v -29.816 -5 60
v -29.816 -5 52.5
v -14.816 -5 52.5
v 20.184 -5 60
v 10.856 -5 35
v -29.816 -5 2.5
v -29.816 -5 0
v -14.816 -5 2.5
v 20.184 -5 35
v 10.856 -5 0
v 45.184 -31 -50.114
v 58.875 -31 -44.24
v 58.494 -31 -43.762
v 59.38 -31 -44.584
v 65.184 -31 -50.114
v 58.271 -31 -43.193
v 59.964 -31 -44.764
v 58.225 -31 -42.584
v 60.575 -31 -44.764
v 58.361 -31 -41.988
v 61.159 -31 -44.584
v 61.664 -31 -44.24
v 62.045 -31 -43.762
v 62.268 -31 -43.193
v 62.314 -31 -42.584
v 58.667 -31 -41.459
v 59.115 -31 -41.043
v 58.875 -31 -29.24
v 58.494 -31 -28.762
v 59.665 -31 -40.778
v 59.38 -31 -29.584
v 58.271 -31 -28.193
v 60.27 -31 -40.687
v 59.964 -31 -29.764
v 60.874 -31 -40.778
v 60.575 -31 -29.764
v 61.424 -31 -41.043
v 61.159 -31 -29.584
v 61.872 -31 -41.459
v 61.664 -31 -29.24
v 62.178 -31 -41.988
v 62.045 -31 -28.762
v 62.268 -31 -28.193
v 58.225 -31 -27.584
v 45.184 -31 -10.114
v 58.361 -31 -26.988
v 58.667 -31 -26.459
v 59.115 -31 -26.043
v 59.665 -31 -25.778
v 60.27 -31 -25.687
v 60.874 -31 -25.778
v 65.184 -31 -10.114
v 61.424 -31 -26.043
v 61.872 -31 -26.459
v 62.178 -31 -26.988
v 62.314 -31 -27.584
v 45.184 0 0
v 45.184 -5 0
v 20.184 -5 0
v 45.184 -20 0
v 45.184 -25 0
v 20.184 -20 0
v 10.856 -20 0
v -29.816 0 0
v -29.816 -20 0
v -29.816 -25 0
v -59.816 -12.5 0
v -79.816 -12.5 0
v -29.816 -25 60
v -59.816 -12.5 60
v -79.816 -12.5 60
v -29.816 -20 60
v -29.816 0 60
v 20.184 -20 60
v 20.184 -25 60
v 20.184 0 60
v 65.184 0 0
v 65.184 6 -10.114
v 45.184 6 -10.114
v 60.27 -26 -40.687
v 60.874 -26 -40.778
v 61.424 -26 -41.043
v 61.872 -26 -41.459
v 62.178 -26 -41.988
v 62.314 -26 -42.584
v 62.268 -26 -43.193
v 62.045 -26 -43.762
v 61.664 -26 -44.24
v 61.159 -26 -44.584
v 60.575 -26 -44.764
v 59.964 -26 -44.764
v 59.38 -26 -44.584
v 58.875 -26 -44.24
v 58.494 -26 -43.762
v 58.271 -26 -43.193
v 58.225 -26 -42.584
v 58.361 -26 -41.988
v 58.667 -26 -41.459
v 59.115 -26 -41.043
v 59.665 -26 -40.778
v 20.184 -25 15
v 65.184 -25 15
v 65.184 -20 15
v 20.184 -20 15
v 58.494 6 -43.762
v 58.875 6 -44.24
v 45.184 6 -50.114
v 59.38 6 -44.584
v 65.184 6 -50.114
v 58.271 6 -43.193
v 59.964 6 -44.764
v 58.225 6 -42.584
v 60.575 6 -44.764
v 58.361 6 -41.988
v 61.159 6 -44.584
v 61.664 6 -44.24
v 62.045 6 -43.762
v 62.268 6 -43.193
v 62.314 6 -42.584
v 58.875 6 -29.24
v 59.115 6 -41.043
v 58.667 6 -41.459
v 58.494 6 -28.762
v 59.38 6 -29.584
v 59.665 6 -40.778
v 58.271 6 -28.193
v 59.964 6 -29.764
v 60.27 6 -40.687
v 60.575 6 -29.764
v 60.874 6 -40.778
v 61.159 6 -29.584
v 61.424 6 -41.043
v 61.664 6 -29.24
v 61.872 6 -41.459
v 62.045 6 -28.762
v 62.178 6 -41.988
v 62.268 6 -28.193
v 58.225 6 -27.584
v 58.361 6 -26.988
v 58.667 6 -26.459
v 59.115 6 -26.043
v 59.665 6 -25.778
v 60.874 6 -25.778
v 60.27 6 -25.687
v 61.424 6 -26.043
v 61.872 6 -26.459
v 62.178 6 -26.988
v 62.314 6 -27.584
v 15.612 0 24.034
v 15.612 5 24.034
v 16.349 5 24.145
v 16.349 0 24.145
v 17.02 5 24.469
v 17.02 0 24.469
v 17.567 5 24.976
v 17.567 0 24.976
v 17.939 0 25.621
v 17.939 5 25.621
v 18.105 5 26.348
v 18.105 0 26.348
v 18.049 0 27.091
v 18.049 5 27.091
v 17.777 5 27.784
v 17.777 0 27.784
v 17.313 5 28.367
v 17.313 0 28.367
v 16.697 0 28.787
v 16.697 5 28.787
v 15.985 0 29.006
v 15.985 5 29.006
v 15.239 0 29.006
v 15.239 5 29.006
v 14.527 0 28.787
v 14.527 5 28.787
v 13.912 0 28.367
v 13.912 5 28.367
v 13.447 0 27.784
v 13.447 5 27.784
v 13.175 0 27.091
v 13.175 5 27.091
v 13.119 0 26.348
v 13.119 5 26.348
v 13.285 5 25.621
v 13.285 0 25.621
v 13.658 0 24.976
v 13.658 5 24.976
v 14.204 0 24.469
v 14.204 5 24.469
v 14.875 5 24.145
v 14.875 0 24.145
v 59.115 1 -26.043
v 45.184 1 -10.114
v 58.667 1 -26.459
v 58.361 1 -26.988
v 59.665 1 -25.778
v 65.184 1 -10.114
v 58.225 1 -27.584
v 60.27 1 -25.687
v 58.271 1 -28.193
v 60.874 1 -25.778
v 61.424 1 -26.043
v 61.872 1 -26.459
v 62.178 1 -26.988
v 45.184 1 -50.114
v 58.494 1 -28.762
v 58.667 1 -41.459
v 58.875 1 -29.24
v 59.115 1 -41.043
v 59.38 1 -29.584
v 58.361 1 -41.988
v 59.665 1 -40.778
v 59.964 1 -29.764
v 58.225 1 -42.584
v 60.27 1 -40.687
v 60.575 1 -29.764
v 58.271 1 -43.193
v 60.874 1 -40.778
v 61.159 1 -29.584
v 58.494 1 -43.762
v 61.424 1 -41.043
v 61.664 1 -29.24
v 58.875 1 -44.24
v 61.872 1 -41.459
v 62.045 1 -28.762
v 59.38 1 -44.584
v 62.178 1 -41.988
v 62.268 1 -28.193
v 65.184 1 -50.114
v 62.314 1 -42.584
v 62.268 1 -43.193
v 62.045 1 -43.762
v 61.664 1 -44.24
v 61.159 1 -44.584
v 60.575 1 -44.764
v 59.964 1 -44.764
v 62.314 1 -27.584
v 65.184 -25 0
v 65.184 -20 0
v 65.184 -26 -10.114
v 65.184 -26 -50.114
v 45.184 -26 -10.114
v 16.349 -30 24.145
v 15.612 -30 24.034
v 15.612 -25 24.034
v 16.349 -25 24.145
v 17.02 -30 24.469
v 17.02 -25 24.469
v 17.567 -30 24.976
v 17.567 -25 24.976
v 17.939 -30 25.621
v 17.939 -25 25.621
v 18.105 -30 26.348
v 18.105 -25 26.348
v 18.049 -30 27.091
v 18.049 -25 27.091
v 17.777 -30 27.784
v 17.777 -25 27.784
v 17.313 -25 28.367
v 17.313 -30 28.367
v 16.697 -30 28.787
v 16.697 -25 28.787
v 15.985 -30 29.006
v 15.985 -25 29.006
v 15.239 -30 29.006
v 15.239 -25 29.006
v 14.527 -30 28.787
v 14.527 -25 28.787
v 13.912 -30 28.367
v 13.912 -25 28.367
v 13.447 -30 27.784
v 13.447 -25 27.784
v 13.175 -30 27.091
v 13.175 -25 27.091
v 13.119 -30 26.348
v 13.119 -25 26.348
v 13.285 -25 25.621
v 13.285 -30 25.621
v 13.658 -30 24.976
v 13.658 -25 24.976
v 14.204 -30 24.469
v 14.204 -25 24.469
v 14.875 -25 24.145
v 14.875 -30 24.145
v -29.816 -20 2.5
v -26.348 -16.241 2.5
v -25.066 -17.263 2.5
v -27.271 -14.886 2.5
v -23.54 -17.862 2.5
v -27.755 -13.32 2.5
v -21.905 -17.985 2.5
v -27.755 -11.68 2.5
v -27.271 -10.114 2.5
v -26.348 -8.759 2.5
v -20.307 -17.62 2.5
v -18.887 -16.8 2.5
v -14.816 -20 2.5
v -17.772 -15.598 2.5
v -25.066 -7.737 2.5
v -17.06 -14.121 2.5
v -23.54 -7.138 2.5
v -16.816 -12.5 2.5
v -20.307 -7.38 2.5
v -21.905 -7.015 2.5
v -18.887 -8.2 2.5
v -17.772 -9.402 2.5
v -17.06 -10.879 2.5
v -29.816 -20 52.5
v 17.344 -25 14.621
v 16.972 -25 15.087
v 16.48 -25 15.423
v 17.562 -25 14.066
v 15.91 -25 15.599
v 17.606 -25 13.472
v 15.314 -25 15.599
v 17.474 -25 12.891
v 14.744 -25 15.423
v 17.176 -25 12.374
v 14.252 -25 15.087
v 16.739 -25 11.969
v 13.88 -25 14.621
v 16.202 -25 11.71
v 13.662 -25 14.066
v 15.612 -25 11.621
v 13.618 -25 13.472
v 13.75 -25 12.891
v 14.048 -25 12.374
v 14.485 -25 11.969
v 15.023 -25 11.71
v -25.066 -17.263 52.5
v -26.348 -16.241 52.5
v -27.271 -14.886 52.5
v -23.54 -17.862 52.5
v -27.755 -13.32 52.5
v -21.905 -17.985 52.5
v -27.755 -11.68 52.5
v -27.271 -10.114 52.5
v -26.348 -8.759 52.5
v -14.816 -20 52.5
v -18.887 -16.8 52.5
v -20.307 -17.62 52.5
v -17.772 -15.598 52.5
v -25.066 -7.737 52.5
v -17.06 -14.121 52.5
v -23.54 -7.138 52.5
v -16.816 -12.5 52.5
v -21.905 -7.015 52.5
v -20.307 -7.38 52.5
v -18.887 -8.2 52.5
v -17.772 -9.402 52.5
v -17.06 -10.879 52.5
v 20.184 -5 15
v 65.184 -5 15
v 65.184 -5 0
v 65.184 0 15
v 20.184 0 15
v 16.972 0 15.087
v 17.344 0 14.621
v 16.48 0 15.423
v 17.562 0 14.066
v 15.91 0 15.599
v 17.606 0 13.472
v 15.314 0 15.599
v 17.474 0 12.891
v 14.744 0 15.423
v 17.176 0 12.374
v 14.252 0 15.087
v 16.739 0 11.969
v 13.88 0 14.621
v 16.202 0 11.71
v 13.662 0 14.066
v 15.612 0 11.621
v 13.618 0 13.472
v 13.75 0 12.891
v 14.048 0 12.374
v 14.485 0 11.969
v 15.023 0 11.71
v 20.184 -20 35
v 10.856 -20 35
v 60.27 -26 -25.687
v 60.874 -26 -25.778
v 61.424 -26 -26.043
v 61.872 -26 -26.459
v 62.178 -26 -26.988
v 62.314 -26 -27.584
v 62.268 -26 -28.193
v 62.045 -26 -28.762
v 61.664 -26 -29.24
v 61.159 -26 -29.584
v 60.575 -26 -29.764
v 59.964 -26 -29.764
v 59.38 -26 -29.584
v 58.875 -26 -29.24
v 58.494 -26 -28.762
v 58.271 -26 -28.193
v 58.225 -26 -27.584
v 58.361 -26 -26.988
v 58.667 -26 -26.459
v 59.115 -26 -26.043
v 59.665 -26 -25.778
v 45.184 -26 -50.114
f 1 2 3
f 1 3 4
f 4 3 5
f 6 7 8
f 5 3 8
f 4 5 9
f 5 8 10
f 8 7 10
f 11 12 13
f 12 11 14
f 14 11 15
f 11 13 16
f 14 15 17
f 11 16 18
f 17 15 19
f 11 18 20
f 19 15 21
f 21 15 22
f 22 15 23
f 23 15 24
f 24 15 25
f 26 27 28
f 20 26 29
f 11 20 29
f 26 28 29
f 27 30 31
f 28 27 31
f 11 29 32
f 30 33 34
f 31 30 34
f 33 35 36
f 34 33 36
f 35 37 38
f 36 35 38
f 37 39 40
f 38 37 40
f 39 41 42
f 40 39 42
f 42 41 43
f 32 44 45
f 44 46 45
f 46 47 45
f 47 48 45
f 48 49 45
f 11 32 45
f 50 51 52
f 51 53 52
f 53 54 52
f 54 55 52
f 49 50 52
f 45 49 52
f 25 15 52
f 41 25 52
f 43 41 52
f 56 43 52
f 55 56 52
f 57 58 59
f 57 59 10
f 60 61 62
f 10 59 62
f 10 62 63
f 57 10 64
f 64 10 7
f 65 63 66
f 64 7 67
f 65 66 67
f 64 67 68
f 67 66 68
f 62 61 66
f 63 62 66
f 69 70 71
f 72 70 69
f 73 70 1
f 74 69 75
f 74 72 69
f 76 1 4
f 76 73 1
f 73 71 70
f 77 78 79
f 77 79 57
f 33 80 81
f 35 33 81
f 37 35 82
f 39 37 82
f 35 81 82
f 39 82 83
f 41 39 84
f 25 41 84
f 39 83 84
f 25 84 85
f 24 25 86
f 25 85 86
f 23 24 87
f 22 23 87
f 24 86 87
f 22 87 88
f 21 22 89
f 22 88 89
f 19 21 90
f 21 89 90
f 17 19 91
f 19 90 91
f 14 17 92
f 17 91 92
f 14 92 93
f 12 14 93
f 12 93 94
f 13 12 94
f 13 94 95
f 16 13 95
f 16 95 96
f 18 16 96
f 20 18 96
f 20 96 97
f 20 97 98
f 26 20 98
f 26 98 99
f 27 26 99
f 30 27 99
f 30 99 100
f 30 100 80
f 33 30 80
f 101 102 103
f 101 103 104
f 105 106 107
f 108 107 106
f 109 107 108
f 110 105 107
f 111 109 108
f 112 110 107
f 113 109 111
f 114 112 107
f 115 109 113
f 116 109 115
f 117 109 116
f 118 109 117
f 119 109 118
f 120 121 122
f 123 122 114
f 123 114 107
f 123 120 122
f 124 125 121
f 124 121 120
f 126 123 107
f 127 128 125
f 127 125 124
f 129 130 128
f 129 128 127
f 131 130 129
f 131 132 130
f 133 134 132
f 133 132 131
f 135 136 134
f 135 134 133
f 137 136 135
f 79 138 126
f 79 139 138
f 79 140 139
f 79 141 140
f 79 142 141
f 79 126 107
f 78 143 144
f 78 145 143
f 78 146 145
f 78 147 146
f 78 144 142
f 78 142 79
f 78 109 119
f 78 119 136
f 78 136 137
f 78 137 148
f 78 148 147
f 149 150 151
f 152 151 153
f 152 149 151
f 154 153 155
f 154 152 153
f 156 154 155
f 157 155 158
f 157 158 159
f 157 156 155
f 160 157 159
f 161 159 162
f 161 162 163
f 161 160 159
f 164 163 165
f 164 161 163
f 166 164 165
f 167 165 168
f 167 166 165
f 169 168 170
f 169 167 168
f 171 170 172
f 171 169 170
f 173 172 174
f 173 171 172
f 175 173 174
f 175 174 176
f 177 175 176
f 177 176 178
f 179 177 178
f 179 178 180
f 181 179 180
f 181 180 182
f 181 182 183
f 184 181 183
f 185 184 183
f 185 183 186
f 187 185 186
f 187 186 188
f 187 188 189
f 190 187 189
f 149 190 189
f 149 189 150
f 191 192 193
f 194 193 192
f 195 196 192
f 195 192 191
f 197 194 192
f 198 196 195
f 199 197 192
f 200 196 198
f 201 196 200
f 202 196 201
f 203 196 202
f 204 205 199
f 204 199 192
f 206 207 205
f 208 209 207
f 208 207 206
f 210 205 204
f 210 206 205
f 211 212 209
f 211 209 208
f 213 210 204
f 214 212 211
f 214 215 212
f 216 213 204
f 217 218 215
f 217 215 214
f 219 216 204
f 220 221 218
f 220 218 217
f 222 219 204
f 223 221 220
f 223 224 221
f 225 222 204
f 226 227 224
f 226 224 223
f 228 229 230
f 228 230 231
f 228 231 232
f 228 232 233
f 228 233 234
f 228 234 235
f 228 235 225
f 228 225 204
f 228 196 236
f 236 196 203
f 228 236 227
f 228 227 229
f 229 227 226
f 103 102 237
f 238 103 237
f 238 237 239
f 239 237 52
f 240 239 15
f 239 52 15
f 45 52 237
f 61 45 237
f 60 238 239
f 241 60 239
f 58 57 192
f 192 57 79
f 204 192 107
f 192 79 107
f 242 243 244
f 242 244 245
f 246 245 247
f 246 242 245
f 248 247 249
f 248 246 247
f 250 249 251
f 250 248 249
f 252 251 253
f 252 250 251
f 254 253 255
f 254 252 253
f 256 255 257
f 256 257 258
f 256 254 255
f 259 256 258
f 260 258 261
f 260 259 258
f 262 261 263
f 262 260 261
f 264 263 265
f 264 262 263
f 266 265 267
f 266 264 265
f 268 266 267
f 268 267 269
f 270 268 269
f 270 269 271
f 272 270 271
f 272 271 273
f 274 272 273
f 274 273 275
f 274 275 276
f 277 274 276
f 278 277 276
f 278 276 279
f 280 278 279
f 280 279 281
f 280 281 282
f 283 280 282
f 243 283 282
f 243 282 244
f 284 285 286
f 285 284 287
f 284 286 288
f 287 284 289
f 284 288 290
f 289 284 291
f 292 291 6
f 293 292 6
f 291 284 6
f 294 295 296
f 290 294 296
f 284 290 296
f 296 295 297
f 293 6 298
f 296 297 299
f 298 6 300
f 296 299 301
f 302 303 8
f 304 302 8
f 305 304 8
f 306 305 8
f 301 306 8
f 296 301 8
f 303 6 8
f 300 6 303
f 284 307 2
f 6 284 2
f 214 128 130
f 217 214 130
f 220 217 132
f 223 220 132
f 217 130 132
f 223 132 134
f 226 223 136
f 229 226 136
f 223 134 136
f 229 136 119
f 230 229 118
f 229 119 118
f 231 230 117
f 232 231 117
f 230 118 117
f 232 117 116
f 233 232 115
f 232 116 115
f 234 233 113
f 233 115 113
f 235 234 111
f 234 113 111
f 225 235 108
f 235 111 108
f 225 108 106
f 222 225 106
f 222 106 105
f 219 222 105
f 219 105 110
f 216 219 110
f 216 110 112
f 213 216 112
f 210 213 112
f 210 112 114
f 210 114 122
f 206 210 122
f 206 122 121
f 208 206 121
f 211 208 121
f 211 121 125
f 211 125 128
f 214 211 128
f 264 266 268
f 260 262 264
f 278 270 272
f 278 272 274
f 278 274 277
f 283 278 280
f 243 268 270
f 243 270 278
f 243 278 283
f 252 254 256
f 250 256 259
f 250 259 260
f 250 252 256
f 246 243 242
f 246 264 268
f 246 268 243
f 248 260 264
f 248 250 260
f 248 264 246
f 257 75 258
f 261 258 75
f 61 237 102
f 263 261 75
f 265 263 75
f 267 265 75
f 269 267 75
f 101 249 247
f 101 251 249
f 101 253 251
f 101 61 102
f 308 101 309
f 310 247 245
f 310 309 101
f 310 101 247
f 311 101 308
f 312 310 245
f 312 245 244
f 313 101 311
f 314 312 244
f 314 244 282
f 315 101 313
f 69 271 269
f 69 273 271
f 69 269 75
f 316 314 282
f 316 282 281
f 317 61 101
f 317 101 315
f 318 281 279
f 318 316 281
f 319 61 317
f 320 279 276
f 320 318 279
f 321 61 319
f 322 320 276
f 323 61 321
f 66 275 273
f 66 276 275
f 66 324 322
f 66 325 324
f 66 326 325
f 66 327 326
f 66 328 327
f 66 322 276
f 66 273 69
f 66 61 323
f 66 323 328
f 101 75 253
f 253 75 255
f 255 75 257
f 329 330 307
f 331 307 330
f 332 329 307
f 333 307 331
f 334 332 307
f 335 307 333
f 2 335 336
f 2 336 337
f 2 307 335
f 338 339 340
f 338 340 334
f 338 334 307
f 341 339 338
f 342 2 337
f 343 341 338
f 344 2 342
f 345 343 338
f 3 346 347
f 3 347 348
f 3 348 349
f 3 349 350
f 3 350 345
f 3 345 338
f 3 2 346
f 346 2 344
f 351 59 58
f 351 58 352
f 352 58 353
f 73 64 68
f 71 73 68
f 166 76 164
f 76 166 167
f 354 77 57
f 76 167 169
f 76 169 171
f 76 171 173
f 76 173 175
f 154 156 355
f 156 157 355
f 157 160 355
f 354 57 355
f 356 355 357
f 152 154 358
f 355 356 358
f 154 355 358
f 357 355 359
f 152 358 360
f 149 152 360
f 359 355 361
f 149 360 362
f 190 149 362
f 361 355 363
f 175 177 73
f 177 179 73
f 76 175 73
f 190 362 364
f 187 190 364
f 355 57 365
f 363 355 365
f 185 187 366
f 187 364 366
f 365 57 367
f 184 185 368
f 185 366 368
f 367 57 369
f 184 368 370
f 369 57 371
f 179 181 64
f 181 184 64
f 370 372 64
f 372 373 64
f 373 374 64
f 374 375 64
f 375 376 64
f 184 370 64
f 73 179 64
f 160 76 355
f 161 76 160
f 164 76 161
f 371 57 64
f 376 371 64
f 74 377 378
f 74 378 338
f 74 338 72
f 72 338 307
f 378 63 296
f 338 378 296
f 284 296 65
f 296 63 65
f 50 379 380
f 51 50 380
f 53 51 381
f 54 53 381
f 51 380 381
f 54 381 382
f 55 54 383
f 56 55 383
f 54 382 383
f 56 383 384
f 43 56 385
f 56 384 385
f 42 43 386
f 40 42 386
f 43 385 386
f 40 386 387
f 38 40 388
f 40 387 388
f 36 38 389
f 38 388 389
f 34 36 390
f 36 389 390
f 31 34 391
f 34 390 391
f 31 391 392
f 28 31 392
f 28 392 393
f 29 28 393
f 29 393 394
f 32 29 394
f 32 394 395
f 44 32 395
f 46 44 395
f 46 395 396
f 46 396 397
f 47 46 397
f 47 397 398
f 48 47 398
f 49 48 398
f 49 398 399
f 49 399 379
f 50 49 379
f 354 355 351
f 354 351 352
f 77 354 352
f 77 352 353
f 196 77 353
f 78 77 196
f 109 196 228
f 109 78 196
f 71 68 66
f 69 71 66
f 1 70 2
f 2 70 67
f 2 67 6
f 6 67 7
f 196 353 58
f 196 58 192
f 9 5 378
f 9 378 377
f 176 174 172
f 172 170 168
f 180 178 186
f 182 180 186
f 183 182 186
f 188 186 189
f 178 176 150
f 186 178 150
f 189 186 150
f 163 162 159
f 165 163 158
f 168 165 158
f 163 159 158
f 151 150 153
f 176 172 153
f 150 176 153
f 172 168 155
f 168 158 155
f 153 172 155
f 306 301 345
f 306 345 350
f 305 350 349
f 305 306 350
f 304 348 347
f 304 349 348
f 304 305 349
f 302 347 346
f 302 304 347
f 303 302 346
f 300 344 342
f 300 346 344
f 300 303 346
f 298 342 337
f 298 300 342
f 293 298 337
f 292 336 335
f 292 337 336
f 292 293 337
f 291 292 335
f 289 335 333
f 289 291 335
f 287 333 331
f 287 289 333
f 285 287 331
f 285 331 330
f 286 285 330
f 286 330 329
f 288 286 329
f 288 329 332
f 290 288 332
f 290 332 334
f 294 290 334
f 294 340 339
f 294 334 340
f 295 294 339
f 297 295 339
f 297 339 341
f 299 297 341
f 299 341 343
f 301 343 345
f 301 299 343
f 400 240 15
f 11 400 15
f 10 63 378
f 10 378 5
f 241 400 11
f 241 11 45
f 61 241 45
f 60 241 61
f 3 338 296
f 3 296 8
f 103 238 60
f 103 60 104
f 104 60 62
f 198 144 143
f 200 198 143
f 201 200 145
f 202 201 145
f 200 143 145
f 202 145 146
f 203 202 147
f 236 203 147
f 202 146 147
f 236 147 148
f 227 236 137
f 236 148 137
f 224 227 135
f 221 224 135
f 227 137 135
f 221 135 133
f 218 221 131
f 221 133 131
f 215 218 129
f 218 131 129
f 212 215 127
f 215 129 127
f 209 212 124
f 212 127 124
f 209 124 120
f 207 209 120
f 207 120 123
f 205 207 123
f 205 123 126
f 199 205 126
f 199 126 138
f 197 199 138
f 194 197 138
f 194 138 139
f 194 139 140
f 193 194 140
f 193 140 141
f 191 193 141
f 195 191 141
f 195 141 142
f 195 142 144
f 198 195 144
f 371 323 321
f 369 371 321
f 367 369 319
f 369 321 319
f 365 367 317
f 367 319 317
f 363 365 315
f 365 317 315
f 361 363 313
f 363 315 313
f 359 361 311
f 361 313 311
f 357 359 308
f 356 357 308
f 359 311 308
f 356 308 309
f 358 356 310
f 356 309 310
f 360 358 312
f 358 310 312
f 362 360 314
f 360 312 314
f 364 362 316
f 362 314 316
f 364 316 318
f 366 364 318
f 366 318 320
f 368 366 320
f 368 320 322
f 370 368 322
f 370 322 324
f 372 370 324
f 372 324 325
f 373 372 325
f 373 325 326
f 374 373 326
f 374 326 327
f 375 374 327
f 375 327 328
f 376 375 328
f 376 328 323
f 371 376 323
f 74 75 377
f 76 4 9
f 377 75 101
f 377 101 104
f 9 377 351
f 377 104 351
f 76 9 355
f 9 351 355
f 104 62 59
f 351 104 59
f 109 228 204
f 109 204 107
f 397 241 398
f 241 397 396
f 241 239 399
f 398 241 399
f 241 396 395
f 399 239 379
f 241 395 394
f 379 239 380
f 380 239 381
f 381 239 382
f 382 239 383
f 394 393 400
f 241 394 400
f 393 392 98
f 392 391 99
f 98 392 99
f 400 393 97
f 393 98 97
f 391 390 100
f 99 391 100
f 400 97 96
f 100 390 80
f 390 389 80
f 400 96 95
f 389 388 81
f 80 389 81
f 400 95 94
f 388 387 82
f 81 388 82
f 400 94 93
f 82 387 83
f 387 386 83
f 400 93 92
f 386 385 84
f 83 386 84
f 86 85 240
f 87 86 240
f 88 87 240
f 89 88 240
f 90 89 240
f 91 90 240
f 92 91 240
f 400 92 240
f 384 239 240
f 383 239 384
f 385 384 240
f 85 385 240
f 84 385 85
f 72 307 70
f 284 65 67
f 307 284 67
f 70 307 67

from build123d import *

# Parameters (mm, degrees)
BOSS_EXTRU_1_DEPTH      = 60
BOSS_EXTRU_2_START      = 2.5
ESQUISSE3_W             = 15
ESQUISSE3_H             = 15
BOSS_EXTRU_2_DEPTH      = 50
ENL_V_START             = -10
ESQUISSE4_R             = 5.5
ENL_V_MAT_EXTRU_1_DEPTH = 105
ESQUISSE5_W             = 9.327942275
ESQUISSE5_H             = 15
BOSS_EXTRU_3_DEPTH      = 35
ESQUISSE12_W            = 95
ESQUISSE12_H            = 15
BOSS_EXTRU_9_DEPTH      = 5
ESQUISSE13_W            = 95
ESQUISSE13_H            = 15
BOSS_EXTRU_10_DEPTH     = 5
BOSS_EXTRU_12_DEPTH     = 20
ESQUISSE18_R            = 2.05
ENL_V_MAT_EXTRU_4_DEPTH = 50
ESQUISSE20_R            = 2
ENL_V_MAT_EXTRU_6_DEPTH = 32
BOSS_EXTRU_13_START     = 5
ESQUISSE21_R            = 2.5
BOSS_EXTRU_13_DEPTH     = 35


with BuildPart() as part:
    # Esquisse1 → Boss.-Extru.1 (new body)
    with BuildSketch(Plane.XY):
        Polygon((-29.816132576, -5), (20.183867424, -5), (20.183867424, 0), (-29.816132576, 0), (-79.816132576, -12.5), (-29.816132576, -25), (20.183867424, -25), (20.183867424, -20), (-29.816132576, -20), (-59.816132576, -12.5), align=None)
    extrude(amount=BOSS_EXTRU_1_DEPTH)

    # Esquisse3 → Boss.-Extru.2 (add)
    with BuildSketch(Plane.XY.offset(BOSS_EXTRU_2_START)):
        with Locations((-22.316132576, -12.5)):
            Rectangle(ESQUISSE3_W, ESQUISSE3_H)
    extrude(amount=BOSS_EXTRU_2_DEPTH)

    # Esquisse4 → Enlèv. mat.-Extru.1 (cut)
    with BuildSketch(Plane.XY.offset(ENL_V_START)):
        with Locations((-22.316132576, -12.5)):
            Circle(ESQUISSE4_R)
    extrude(amount=ENL_V_MAT_EXTRU_1_DEPTH, mode=Mode.SUBTRACT)

    # Esquisse5 → Boss.-Extru.3 (add)
    with BuildSketch(Plane.XY):
        with Locations((15.519896287, -12.5)):
            Rectangle(ESQUISSE5_W, ESQUISSE5_H)
    extrude(amount=BOSS_EXTRU_3_DEPTH)

    # Esquisse12 → Boss.-Extru.9 (add)
    with BuildSketch(Plane(origin=(0, 0, 0), x_dir=(1, 0, 0), z_dir=(0, 1, 0))):
        with Locations((17.683867424, -7.5)):
            Rectangle(ESQUISSE12_W, ESQUISSE12_H)
    extrude(amount=-BOSS_EXTRU_9_DEPTH)

    # Esquisse13 → Boss.-Extru.10 (add)
    with BuildSketch(Plane(origin=(0, -25, 0), x_dir=(-1, 0, 0), z_dir=(0, -1, 0))):
        with Locations((-17.683867424, -7.5)):
            Rectangle(ESQUISSE13_W, ESQUISSE13_H)
    extrude(amount=-BOSS_EXTRU_10_DEPTH)

    # Esquisse14 → Boss.-Extru.12 (add)
    with BuildSketch(Plane(origin=(65.183867424, 0, 0), x_dir=(0, 0, -1), z_dir=(1, 0, 0))):
        Polygon((0, 0), (-15, 0), (-15, -5), (0, -5), (10.113760869, 1), (50.113760869, 1), (50.113760869, 6), (10.113760869, 6), align=None)
        Polygon((-15, -25), (-15, -20), (0, -20), (10.113760869, -26), (50.113760869, -26), (50.113760869, -31), (10.113760869, -31), (0, -25), align=None)
    extrude(amount=-BOSS_EXTRU_12_DEPTH)

    # Esquisse18 → Enlèv. mat.-Extru.4 (cut)
    with BuildSketch(Plane(origin=(0, 6, 0), x_dir=(1, 0, 0), z_dir=(0, 1, 0))):
        with Locations(Location((60.269613545, 42.737284556, 0), (0, 0, 270))):  # turned: the seam where the file's is
            Circle(ESQUISSE18_R)
        with Locations(Location((60.269613545, 27.737284556, 0), (0, 0, 270))):  # turned: the seam where the file's is
            Circle(ESQUISSE18_R)
    extrude(amount=-ENL_V_MAT_EXTRU_4_DEPTH, mode=Mode.SUBTRACT)

    # Esquisse20 → Enlèv. mat.-Extru.6 (cut, through all)
    with BuildSketch(Plane(origin=(0, -25, 0), x_dir=(-1, 0, 0), z_dir=(0, -1, 0))):
        with Locations(Location((-15.612089386, -13.621364953, 0), (0, 0, 90))):  # turned: the seam where the file's is
            Circle(ESQUISSE20_R)
    extrude(amount=-ENL_V_MAT_EXTRU_6_DEPTH, mode=Mode.SUBTRACT)

    # Esquisse21 → Boss.-Extru.13 (add)
    with BuildSketch(Plane(origin=(0, -25, 0), x_dir=(-1, 0, 0), z_dir=(0, -1, 0)).offset(BOSS_EXTRU_13_START)):
        with Locations(Location((-15.612089386, -26.534383987, 0), (0, 0, 90))):  # turned: the seam where the file's is
            Circle(ESQUISSE21_R)
    extrude(amount=-BOSS_EXTRU_13_DEPTH)


solid = part.part
